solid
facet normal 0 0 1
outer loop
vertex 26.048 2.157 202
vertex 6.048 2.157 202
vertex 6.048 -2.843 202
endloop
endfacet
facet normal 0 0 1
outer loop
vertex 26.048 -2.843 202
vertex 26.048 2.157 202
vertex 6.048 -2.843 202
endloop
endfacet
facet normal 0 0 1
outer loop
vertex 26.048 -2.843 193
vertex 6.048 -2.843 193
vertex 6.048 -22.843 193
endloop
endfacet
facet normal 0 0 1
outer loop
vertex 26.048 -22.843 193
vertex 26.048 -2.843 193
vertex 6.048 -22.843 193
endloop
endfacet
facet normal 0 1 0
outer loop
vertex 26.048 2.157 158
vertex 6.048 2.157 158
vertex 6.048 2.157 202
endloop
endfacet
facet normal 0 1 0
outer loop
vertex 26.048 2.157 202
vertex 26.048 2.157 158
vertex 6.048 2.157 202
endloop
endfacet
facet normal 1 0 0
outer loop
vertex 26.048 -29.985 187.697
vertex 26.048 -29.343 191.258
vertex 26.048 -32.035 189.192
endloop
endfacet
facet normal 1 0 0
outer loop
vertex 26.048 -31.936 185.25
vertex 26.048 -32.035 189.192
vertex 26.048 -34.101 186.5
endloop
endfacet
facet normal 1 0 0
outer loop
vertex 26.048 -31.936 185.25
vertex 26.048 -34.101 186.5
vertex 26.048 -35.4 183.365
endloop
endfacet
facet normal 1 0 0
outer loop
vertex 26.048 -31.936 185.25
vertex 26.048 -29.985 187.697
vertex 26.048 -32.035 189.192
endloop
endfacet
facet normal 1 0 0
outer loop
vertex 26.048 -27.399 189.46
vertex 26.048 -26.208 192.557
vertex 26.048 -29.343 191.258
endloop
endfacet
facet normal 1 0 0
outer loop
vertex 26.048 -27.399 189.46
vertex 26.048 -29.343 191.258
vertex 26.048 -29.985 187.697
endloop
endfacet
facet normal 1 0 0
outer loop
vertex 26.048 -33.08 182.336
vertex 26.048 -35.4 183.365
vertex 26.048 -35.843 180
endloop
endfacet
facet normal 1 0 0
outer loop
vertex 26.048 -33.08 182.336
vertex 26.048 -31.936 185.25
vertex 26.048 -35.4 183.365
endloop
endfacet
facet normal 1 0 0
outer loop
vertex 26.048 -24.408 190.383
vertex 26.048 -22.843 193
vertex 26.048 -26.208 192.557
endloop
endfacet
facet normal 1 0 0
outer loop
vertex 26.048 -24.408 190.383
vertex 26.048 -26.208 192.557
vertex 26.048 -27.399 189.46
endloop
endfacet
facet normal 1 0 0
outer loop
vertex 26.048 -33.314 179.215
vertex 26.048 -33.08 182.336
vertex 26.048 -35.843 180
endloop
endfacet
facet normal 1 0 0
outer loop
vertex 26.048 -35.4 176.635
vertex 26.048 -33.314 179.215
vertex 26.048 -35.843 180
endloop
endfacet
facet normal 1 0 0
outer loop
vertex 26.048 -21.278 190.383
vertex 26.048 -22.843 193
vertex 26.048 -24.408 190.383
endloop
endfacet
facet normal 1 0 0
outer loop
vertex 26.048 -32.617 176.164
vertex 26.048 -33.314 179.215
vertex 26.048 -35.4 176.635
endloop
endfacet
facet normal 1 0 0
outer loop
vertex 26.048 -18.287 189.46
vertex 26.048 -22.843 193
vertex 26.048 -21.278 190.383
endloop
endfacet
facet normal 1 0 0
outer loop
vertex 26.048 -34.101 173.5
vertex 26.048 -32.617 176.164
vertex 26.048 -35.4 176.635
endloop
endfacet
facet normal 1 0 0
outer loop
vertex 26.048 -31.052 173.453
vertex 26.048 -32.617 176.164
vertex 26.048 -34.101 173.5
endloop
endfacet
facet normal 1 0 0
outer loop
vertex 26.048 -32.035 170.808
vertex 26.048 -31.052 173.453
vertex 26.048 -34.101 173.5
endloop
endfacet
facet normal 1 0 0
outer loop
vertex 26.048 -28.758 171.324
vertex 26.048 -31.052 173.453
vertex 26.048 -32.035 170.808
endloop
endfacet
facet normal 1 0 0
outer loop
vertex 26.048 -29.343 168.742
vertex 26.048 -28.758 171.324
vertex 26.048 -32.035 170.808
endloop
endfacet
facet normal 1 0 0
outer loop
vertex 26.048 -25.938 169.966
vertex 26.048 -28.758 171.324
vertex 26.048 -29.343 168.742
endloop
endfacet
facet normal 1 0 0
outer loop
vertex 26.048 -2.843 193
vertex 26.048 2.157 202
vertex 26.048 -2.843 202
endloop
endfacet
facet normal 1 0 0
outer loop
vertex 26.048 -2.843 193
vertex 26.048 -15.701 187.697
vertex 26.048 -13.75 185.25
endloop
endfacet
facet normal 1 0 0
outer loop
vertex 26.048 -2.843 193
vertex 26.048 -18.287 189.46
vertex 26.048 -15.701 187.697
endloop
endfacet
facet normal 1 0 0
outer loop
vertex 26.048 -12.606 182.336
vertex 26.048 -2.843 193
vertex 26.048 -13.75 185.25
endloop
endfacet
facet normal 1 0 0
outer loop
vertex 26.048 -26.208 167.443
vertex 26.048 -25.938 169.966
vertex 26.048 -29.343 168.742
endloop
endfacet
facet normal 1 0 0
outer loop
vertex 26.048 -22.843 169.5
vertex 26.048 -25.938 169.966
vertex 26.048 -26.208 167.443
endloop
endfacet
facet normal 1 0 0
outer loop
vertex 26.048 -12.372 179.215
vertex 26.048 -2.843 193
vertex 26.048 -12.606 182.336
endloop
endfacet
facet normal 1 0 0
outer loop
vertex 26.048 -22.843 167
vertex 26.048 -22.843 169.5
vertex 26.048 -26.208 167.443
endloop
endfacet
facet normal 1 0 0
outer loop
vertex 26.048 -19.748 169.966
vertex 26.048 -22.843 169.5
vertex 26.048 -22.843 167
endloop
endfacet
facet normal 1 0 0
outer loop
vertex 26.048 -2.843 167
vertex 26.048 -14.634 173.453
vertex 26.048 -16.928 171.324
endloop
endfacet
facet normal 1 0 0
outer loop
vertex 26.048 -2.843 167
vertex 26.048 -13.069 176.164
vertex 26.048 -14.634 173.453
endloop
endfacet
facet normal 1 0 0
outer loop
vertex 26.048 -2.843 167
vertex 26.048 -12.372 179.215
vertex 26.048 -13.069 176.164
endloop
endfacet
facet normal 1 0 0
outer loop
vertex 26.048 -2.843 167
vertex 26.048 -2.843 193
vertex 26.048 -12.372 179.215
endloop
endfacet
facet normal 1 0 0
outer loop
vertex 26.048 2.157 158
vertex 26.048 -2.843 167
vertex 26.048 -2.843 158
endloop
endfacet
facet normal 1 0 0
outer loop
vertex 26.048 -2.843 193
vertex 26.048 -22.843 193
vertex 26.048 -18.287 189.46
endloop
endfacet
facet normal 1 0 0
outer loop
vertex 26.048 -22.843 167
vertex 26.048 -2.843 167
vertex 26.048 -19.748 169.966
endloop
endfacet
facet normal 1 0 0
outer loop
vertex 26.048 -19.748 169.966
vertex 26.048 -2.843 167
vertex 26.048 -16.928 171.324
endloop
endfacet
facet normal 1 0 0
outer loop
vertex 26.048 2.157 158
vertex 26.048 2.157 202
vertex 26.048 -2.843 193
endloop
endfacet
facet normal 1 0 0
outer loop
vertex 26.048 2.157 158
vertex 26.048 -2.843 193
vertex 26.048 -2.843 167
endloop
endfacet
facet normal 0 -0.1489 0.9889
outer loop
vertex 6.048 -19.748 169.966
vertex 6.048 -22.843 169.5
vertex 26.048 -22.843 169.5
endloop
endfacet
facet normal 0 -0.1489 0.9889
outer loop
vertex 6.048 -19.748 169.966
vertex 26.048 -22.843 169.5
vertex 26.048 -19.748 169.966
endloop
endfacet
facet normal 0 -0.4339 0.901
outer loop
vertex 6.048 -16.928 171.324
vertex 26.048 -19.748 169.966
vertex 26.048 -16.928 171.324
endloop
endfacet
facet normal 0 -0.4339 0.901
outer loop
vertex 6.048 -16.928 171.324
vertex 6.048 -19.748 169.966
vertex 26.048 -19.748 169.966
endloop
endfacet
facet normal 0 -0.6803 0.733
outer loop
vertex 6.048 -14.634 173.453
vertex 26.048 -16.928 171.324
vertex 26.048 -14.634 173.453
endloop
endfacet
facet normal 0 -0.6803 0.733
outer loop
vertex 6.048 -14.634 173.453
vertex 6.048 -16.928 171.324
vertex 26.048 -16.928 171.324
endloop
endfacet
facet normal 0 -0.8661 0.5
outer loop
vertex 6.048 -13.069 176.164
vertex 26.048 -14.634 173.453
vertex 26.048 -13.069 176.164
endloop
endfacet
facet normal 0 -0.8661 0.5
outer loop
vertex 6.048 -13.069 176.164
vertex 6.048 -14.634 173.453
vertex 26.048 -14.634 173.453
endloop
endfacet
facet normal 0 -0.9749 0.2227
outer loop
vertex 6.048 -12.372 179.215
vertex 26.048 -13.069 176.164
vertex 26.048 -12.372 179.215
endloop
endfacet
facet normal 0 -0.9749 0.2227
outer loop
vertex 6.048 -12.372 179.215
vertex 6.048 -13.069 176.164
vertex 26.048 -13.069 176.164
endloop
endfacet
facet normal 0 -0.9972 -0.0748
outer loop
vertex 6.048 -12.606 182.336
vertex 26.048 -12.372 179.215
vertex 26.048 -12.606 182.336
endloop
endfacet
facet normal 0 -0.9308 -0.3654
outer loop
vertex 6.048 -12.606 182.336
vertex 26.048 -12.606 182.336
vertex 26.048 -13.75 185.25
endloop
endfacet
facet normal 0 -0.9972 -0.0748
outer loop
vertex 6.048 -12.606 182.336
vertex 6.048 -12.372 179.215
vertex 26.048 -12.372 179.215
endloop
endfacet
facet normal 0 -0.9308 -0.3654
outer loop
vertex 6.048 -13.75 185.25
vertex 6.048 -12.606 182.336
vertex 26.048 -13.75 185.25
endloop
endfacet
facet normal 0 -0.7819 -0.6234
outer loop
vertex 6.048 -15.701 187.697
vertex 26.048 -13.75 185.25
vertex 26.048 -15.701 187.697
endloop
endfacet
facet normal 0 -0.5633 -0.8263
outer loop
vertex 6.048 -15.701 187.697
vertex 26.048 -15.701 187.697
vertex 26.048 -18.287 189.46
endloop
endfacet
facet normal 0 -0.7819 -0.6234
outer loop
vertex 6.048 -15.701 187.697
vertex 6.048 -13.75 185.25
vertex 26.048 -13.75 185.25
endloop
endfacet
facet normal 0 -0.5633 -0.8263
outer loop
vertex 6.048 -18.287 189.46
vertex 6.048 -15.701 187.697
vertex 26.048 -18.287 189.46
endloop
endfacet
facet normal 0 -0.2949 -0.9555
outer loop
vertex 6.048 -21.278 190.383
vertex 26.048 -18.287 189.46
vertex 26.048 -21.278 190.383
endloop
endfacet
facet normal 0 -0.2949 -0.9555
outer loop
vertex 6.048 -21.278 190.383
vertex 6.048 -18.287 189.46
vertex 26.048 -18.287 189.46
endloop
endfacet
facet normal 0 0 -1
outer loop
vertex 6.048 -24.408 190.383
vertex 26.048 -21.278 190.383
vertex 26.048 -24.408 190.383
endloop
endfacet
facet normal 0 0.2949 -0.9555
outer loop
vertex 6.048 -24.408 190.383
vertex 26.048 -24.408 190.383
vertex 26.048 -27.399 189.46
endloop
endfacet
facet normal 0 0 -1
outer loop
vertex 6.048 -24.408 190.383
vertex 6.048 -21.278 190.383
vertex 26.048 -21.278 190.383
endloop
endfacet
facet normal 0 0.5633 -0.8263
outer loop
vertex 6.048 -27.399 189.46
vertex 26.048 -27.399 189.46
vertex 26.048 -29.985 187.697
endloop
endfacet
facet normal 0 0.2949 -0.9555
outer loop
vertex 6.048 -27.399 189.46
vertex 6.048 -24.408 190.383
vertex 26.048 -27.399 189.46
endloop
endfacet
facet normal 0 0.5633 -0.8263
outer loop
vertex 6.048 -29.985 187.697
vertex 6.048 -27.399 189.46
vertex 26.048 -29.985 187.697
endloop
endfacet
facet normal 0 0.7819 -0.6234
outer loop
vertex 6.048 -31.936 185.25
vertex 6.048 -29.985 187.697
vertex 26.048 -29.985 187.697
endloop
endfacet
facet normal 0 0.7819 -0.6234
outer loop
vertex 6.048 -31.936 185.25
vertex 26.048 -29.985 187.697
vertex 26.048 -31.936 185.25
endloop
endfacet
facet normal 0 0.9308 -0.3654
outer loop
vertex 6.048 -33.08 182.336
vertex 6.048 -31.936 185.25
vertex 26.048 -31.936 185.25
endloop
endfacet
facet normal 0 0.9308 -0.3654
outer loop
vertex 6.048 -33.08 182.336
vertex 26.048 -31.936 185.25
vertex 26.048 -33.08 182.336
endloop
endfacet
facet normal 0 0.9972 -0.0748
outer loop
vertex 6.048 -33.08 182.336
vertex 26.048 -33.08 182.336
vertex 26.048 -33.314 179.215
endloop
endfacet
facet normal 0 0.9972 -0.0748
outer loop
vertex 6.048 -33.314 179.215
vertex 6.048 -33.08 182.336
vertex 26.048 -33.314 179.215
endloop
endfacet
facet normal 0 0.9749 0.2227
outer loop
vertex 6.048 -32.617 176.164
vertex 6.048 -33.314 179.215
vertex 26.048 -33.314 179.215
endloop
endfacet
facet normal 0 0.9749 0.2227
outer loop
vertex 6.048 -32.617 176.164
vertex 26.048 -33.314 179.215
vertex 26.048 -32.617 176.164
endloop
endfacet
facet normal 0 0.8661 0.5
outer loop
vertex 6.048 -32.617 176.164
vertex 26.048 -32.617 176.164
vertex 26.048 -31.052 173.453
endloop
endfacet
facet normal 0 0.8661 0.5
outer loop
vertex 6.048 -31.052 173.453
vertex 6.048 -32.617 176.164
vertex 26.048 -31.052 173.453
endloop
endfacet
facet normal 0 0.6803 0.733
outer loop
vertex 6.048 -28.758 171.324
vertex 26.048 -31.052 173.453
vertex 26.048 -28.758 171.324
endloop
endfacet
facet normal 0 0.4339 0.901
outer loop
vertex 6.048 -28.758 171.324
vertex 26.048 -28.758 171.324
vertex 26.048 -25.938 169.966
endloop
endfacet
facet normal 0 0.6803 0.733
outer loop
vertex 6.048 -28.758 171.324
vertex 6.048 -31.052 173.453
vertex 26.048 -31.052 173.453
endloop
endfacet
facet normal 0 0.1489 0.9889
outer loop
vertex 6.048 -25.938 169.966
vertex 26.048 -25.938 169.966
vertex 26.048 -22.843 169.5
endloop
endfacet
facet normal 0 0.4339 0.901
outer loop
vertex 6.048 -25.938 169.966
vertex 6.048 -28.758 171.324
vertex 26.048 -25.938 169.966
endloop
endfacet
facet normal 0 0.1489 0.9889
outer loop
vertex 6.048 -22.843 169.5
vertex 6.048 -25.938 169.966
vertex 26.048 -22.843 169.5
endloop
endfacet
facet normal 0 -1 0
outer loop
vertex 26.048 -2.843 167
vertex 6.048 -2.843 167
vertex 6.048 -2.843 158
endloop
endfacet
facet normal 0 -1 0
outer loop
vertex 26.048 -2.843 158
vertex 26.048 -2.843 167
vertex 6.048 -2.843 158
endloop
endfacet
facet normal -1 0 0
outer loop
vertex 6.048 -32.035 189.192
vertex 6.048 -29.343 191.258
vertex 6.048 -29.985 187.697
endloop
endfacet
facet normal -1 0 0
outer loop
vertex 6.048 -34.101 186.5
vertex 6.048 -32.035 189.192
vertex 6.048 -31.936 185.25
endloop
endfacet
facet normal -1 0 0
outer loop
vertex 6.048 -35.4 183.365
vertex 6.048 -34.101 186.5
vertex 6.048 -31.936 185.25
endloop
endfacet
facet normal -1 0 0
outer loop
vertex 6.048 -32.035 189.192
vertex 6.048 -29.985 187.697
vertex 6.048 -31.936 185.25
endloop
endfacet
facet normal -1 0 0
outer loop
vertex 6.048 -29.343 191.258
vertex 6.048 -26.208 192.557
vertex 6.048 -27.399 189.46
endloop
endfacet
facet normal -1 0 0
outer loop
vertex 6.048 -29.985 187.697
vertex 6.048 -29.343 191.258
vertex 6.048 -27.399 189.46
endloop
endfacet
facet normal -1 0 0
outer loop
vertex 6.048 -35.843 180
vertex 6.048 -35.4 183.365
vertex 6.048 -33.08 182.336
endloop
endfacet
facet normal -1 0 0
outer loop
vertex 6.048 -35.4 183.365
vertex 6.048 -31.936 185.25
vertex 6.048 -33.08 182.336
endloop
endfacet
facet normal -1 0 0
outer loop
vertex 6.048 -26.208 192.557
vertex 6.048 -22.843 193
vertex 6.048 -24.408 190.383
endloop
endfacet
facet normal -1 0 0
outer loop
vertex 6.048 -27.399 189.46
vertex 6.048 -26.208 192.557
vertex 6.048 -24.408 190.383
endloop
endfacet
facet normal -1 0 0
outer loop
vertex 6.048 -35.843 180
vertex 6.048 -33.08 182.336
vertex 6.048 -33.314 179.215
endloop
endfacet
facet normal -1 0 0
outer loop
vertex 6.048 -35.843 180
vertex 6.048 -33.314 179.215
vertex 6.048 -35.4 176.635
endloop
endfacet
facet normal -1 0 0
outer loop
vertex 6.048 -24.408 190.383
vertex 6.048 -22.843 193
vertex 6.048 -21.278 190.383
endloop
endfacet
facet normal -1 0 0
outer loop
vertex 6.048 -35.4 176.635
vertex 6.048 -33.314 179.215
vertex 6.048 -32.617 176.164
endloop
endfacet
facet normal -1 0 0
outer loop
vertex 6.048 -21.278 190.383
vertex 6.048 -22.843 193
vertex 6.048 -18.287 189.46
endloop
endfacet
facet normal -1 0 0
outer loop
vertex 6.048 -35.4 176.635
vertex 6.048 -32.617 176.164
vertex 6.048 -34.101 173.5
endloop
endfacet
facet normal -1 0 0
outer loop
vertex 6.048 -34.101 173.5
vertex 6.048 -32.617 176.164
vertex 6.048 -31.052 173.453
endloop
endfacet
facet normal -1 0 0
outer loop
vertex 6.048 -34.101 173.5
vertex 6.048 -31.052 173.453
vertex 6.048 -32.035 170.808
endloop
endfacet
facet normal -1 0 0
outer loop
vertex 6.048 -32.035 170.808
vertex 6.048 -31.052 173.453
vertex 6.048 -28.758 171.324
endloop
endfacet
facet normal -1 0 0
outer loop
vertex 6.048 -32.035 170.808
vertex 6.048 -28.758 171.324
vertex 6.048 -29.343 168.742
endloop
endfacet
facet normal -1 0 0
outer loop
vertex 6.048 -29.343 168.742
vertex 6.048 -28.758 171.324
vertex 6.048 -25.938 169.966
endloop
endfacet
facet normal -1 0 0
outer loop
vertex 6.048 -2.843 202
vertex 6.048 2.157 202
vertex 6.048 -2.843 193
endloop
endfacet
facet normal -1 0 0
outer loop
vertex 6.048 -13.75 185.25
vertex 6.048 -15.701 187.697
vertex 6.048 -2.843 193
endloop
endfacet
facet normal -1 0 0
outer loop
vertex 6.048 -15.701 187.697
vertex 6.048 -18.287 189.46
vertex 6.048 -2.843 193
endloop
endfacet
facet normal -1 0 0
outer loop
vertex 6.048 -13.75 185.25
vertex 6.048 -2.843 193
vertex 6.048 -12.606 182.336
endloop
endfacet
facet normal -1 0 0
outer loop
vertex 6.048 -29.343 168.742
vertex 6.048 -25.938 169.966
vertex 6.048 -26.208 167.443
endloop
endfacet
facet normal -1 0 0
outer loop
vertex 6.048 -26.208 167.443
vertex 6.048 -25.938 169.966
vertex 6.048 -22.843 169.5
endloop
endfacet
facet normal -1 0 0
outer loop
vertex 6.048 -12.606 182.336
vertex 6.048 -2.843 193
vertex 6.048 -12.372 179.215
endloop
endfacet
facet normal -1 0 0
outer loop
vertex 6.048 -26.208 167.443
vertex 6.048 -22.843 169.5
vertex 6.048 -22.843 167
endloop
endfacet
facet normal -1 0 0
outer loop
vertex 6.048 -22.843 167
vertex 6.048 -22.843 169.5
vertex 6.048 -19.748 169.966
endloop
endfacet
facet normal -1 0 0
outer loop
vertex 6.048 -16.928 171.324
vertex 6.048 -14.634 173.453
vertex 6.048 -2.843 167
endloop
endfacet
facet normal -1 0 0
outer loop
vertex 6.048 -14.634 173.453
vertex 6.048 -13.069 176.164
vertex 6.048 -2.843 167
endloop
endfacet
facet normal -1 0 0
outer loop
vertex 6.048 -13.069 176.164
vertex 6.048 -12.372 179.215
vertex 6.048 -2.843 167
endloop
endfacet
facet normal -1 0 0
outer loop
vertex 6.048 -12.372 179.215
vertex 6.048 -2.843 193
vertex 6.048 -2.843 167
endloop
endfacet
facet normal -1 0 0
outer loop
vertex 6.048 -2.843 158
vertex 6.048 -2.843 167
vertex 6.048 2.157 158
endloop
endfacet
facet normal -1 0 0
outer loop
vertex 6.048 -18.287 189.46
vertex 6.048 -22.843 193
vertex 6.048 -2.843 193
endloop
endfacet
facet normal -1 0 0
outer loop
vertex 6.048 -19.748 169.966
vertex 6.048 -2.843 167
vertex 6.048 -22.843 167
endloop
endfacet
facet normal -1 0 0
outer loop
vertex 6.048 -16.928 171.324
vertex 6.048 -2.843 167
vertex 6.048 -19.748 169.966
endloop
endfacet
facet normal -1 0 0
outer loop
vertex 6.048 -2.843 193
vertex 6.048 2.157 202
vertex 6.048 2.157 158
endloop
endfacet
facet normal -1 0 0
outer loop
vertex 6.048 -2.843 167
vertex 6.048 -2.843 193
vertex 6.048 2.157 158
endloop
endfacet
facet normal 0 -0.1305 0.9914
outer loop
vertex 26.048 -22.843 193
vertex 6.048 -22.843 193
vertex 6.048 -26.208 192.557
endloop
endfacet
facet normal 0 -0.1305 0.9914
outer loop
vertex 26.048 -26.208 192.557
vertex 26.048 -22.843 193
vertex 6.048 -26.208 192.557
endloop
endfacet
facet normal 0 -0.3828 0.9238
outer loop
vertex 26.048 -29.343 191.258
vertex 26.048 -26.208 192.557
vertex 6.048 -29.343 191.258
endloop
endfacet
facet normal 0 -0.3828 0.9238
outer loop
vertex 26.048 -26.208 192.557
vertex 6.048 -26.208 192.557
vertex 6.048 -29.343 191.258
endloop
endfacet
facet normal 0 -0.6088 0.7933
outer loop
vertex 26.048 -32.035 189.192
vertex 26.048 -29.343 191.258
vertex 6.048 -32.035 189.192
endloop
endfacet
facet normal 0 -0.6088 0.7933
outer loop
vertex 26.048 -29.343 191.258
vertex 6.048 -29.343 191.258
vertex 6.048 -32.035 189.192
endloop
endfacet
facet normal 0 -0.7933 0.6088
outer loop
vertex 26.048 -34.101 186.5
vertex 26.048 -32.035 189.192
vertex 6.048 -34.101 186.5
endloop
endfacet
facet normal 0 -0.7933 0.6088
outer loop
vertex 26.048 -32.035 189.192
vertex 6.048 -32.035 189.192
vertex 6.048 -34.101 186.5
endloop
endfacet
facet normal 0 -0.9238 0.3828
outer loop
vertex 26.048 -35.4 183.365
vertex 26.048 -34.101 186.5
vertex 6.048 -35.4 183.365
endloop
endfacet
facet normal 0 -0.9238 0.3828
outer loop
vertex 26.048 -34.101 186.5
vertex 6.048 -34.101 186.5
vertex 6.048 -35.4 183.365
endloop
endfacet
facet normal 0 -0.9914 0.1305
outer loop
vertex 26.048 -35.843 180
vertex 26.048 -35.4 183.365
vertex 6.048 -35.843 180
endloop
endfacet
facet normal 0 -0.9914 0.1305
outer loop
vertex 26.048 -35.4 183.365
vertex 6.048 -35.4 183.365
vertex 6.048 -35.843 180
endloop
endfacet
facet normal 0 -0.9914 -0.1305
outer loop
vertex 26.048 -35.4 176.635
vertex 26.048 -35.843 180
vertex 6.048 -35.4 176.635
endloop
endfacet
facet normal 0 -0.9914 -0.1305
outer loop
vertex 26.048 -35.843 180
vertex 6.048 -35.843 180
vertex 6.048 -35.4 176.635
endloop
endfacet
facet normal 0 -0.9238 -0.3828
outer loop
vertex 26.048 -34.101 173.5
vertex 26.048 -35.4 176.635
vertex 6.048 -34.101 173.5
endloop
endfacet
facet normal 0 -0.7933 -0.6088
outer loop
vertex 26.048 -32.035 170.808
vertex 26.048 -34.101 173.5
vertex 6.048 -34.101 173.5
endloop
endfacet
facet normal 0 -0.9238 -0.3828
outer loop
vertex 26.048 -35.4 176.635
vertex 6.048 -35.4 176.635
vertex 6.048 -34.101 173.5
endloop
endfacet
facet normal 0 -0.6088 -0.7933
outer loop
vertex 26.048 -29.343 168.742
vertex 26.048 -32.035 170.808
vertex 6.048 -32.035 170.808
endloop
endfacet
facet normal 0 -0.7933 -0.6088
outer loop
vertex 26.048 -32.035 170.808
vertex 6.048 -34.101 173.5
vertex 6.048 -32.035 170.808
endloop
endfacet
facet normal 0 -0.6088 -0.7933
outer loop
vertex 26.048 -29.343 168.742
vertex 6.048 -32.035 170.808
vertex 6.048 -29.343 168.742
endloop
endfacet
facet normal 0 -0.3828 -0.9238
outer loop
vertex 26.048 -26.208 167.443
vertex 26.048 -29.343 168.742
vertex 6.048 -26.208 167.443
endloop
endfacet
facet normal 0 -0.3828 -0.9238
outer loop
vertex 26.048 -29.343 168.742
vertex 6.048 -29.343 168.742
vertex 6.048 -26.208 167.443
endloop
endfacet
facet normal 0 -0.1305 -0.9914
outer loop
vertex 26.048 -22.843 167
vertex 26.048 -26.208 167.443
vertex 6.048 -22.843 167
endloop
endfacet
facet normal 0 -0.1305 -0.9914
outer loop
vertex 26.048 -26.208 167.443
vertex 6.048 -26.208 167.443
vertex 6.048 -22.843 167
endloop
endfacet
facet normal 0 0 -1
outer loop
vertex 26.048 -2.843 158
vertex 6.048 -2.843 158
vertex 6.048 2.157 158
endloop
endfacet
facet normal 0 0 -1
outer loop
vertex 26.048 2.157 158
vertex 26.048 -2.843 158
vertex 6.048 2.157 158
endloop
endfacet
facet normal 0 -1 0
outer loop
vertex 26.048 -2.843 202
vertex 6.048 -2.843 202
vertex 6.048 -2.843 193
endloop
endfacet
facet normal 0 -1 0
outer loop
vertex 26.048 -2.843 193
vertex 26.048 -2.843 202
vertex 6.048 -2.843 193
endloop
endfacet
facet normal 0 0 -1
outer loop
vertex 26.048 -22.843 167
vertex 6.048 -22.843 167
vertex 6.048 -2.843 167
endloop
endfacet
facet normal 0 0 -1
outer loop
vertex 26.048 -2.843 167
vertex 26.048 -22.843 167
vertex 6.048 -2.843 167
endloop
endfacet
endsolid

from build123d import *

# Parameters (mm, degrees)
EXTRUDE_START       = -20
EXTRUDE_1_OUTLINE_R = 10.5
EXTRUDE_1_DEPTH     = 20


# Read off the part's stored shape, not the designer's step: 填料-伸長1
with BuildPart() as part:
    # 填料-伸長1 outline → 填料-伸長1 (new body)
    with BuildSketch(Plane(origin=(26.04788271, 0, 0), x_dir=(0, 0, -1), z_dir=(1, 0, 0)).offset(EXTRUDE_START)):
        with BuildLine():
            Line((-201.999999965, -2.843045968), (-192.999999965, -2.843045968))
            Line((-192.999999965, -2.843045968), (-192.999999965, -22.843045968))
            ThreePointArc((-192.999999965, -22.843045968), (-179.999999965, -35.843045968), (-166.999999965, -22.843045968))
            Line((-166.999999965, -22.843045968), (-166.999999965, -2.843045968))
            Line((-166.999999965, -2.843045968), (-157.999999965, -2.843045968))
            Line((-157.999999965, -2.843045968), (-157.999999965, 2.156954032))
            Line((-157.999999965, 2.156954032), (-201.999999965, 2.156954032))
            Line((-201.999999965, 2.156954032), (-201.999999965, -2.843045968))
        make_face()
        with Locations((-179.999999965, -22.843045968)):
            Circle(EXTRUDE_1_OUTLINE_R, mode=Mode.SUBTRACT)
    extrude(amount=EXTRUDE_1_DEPTH)


solid = part.part
